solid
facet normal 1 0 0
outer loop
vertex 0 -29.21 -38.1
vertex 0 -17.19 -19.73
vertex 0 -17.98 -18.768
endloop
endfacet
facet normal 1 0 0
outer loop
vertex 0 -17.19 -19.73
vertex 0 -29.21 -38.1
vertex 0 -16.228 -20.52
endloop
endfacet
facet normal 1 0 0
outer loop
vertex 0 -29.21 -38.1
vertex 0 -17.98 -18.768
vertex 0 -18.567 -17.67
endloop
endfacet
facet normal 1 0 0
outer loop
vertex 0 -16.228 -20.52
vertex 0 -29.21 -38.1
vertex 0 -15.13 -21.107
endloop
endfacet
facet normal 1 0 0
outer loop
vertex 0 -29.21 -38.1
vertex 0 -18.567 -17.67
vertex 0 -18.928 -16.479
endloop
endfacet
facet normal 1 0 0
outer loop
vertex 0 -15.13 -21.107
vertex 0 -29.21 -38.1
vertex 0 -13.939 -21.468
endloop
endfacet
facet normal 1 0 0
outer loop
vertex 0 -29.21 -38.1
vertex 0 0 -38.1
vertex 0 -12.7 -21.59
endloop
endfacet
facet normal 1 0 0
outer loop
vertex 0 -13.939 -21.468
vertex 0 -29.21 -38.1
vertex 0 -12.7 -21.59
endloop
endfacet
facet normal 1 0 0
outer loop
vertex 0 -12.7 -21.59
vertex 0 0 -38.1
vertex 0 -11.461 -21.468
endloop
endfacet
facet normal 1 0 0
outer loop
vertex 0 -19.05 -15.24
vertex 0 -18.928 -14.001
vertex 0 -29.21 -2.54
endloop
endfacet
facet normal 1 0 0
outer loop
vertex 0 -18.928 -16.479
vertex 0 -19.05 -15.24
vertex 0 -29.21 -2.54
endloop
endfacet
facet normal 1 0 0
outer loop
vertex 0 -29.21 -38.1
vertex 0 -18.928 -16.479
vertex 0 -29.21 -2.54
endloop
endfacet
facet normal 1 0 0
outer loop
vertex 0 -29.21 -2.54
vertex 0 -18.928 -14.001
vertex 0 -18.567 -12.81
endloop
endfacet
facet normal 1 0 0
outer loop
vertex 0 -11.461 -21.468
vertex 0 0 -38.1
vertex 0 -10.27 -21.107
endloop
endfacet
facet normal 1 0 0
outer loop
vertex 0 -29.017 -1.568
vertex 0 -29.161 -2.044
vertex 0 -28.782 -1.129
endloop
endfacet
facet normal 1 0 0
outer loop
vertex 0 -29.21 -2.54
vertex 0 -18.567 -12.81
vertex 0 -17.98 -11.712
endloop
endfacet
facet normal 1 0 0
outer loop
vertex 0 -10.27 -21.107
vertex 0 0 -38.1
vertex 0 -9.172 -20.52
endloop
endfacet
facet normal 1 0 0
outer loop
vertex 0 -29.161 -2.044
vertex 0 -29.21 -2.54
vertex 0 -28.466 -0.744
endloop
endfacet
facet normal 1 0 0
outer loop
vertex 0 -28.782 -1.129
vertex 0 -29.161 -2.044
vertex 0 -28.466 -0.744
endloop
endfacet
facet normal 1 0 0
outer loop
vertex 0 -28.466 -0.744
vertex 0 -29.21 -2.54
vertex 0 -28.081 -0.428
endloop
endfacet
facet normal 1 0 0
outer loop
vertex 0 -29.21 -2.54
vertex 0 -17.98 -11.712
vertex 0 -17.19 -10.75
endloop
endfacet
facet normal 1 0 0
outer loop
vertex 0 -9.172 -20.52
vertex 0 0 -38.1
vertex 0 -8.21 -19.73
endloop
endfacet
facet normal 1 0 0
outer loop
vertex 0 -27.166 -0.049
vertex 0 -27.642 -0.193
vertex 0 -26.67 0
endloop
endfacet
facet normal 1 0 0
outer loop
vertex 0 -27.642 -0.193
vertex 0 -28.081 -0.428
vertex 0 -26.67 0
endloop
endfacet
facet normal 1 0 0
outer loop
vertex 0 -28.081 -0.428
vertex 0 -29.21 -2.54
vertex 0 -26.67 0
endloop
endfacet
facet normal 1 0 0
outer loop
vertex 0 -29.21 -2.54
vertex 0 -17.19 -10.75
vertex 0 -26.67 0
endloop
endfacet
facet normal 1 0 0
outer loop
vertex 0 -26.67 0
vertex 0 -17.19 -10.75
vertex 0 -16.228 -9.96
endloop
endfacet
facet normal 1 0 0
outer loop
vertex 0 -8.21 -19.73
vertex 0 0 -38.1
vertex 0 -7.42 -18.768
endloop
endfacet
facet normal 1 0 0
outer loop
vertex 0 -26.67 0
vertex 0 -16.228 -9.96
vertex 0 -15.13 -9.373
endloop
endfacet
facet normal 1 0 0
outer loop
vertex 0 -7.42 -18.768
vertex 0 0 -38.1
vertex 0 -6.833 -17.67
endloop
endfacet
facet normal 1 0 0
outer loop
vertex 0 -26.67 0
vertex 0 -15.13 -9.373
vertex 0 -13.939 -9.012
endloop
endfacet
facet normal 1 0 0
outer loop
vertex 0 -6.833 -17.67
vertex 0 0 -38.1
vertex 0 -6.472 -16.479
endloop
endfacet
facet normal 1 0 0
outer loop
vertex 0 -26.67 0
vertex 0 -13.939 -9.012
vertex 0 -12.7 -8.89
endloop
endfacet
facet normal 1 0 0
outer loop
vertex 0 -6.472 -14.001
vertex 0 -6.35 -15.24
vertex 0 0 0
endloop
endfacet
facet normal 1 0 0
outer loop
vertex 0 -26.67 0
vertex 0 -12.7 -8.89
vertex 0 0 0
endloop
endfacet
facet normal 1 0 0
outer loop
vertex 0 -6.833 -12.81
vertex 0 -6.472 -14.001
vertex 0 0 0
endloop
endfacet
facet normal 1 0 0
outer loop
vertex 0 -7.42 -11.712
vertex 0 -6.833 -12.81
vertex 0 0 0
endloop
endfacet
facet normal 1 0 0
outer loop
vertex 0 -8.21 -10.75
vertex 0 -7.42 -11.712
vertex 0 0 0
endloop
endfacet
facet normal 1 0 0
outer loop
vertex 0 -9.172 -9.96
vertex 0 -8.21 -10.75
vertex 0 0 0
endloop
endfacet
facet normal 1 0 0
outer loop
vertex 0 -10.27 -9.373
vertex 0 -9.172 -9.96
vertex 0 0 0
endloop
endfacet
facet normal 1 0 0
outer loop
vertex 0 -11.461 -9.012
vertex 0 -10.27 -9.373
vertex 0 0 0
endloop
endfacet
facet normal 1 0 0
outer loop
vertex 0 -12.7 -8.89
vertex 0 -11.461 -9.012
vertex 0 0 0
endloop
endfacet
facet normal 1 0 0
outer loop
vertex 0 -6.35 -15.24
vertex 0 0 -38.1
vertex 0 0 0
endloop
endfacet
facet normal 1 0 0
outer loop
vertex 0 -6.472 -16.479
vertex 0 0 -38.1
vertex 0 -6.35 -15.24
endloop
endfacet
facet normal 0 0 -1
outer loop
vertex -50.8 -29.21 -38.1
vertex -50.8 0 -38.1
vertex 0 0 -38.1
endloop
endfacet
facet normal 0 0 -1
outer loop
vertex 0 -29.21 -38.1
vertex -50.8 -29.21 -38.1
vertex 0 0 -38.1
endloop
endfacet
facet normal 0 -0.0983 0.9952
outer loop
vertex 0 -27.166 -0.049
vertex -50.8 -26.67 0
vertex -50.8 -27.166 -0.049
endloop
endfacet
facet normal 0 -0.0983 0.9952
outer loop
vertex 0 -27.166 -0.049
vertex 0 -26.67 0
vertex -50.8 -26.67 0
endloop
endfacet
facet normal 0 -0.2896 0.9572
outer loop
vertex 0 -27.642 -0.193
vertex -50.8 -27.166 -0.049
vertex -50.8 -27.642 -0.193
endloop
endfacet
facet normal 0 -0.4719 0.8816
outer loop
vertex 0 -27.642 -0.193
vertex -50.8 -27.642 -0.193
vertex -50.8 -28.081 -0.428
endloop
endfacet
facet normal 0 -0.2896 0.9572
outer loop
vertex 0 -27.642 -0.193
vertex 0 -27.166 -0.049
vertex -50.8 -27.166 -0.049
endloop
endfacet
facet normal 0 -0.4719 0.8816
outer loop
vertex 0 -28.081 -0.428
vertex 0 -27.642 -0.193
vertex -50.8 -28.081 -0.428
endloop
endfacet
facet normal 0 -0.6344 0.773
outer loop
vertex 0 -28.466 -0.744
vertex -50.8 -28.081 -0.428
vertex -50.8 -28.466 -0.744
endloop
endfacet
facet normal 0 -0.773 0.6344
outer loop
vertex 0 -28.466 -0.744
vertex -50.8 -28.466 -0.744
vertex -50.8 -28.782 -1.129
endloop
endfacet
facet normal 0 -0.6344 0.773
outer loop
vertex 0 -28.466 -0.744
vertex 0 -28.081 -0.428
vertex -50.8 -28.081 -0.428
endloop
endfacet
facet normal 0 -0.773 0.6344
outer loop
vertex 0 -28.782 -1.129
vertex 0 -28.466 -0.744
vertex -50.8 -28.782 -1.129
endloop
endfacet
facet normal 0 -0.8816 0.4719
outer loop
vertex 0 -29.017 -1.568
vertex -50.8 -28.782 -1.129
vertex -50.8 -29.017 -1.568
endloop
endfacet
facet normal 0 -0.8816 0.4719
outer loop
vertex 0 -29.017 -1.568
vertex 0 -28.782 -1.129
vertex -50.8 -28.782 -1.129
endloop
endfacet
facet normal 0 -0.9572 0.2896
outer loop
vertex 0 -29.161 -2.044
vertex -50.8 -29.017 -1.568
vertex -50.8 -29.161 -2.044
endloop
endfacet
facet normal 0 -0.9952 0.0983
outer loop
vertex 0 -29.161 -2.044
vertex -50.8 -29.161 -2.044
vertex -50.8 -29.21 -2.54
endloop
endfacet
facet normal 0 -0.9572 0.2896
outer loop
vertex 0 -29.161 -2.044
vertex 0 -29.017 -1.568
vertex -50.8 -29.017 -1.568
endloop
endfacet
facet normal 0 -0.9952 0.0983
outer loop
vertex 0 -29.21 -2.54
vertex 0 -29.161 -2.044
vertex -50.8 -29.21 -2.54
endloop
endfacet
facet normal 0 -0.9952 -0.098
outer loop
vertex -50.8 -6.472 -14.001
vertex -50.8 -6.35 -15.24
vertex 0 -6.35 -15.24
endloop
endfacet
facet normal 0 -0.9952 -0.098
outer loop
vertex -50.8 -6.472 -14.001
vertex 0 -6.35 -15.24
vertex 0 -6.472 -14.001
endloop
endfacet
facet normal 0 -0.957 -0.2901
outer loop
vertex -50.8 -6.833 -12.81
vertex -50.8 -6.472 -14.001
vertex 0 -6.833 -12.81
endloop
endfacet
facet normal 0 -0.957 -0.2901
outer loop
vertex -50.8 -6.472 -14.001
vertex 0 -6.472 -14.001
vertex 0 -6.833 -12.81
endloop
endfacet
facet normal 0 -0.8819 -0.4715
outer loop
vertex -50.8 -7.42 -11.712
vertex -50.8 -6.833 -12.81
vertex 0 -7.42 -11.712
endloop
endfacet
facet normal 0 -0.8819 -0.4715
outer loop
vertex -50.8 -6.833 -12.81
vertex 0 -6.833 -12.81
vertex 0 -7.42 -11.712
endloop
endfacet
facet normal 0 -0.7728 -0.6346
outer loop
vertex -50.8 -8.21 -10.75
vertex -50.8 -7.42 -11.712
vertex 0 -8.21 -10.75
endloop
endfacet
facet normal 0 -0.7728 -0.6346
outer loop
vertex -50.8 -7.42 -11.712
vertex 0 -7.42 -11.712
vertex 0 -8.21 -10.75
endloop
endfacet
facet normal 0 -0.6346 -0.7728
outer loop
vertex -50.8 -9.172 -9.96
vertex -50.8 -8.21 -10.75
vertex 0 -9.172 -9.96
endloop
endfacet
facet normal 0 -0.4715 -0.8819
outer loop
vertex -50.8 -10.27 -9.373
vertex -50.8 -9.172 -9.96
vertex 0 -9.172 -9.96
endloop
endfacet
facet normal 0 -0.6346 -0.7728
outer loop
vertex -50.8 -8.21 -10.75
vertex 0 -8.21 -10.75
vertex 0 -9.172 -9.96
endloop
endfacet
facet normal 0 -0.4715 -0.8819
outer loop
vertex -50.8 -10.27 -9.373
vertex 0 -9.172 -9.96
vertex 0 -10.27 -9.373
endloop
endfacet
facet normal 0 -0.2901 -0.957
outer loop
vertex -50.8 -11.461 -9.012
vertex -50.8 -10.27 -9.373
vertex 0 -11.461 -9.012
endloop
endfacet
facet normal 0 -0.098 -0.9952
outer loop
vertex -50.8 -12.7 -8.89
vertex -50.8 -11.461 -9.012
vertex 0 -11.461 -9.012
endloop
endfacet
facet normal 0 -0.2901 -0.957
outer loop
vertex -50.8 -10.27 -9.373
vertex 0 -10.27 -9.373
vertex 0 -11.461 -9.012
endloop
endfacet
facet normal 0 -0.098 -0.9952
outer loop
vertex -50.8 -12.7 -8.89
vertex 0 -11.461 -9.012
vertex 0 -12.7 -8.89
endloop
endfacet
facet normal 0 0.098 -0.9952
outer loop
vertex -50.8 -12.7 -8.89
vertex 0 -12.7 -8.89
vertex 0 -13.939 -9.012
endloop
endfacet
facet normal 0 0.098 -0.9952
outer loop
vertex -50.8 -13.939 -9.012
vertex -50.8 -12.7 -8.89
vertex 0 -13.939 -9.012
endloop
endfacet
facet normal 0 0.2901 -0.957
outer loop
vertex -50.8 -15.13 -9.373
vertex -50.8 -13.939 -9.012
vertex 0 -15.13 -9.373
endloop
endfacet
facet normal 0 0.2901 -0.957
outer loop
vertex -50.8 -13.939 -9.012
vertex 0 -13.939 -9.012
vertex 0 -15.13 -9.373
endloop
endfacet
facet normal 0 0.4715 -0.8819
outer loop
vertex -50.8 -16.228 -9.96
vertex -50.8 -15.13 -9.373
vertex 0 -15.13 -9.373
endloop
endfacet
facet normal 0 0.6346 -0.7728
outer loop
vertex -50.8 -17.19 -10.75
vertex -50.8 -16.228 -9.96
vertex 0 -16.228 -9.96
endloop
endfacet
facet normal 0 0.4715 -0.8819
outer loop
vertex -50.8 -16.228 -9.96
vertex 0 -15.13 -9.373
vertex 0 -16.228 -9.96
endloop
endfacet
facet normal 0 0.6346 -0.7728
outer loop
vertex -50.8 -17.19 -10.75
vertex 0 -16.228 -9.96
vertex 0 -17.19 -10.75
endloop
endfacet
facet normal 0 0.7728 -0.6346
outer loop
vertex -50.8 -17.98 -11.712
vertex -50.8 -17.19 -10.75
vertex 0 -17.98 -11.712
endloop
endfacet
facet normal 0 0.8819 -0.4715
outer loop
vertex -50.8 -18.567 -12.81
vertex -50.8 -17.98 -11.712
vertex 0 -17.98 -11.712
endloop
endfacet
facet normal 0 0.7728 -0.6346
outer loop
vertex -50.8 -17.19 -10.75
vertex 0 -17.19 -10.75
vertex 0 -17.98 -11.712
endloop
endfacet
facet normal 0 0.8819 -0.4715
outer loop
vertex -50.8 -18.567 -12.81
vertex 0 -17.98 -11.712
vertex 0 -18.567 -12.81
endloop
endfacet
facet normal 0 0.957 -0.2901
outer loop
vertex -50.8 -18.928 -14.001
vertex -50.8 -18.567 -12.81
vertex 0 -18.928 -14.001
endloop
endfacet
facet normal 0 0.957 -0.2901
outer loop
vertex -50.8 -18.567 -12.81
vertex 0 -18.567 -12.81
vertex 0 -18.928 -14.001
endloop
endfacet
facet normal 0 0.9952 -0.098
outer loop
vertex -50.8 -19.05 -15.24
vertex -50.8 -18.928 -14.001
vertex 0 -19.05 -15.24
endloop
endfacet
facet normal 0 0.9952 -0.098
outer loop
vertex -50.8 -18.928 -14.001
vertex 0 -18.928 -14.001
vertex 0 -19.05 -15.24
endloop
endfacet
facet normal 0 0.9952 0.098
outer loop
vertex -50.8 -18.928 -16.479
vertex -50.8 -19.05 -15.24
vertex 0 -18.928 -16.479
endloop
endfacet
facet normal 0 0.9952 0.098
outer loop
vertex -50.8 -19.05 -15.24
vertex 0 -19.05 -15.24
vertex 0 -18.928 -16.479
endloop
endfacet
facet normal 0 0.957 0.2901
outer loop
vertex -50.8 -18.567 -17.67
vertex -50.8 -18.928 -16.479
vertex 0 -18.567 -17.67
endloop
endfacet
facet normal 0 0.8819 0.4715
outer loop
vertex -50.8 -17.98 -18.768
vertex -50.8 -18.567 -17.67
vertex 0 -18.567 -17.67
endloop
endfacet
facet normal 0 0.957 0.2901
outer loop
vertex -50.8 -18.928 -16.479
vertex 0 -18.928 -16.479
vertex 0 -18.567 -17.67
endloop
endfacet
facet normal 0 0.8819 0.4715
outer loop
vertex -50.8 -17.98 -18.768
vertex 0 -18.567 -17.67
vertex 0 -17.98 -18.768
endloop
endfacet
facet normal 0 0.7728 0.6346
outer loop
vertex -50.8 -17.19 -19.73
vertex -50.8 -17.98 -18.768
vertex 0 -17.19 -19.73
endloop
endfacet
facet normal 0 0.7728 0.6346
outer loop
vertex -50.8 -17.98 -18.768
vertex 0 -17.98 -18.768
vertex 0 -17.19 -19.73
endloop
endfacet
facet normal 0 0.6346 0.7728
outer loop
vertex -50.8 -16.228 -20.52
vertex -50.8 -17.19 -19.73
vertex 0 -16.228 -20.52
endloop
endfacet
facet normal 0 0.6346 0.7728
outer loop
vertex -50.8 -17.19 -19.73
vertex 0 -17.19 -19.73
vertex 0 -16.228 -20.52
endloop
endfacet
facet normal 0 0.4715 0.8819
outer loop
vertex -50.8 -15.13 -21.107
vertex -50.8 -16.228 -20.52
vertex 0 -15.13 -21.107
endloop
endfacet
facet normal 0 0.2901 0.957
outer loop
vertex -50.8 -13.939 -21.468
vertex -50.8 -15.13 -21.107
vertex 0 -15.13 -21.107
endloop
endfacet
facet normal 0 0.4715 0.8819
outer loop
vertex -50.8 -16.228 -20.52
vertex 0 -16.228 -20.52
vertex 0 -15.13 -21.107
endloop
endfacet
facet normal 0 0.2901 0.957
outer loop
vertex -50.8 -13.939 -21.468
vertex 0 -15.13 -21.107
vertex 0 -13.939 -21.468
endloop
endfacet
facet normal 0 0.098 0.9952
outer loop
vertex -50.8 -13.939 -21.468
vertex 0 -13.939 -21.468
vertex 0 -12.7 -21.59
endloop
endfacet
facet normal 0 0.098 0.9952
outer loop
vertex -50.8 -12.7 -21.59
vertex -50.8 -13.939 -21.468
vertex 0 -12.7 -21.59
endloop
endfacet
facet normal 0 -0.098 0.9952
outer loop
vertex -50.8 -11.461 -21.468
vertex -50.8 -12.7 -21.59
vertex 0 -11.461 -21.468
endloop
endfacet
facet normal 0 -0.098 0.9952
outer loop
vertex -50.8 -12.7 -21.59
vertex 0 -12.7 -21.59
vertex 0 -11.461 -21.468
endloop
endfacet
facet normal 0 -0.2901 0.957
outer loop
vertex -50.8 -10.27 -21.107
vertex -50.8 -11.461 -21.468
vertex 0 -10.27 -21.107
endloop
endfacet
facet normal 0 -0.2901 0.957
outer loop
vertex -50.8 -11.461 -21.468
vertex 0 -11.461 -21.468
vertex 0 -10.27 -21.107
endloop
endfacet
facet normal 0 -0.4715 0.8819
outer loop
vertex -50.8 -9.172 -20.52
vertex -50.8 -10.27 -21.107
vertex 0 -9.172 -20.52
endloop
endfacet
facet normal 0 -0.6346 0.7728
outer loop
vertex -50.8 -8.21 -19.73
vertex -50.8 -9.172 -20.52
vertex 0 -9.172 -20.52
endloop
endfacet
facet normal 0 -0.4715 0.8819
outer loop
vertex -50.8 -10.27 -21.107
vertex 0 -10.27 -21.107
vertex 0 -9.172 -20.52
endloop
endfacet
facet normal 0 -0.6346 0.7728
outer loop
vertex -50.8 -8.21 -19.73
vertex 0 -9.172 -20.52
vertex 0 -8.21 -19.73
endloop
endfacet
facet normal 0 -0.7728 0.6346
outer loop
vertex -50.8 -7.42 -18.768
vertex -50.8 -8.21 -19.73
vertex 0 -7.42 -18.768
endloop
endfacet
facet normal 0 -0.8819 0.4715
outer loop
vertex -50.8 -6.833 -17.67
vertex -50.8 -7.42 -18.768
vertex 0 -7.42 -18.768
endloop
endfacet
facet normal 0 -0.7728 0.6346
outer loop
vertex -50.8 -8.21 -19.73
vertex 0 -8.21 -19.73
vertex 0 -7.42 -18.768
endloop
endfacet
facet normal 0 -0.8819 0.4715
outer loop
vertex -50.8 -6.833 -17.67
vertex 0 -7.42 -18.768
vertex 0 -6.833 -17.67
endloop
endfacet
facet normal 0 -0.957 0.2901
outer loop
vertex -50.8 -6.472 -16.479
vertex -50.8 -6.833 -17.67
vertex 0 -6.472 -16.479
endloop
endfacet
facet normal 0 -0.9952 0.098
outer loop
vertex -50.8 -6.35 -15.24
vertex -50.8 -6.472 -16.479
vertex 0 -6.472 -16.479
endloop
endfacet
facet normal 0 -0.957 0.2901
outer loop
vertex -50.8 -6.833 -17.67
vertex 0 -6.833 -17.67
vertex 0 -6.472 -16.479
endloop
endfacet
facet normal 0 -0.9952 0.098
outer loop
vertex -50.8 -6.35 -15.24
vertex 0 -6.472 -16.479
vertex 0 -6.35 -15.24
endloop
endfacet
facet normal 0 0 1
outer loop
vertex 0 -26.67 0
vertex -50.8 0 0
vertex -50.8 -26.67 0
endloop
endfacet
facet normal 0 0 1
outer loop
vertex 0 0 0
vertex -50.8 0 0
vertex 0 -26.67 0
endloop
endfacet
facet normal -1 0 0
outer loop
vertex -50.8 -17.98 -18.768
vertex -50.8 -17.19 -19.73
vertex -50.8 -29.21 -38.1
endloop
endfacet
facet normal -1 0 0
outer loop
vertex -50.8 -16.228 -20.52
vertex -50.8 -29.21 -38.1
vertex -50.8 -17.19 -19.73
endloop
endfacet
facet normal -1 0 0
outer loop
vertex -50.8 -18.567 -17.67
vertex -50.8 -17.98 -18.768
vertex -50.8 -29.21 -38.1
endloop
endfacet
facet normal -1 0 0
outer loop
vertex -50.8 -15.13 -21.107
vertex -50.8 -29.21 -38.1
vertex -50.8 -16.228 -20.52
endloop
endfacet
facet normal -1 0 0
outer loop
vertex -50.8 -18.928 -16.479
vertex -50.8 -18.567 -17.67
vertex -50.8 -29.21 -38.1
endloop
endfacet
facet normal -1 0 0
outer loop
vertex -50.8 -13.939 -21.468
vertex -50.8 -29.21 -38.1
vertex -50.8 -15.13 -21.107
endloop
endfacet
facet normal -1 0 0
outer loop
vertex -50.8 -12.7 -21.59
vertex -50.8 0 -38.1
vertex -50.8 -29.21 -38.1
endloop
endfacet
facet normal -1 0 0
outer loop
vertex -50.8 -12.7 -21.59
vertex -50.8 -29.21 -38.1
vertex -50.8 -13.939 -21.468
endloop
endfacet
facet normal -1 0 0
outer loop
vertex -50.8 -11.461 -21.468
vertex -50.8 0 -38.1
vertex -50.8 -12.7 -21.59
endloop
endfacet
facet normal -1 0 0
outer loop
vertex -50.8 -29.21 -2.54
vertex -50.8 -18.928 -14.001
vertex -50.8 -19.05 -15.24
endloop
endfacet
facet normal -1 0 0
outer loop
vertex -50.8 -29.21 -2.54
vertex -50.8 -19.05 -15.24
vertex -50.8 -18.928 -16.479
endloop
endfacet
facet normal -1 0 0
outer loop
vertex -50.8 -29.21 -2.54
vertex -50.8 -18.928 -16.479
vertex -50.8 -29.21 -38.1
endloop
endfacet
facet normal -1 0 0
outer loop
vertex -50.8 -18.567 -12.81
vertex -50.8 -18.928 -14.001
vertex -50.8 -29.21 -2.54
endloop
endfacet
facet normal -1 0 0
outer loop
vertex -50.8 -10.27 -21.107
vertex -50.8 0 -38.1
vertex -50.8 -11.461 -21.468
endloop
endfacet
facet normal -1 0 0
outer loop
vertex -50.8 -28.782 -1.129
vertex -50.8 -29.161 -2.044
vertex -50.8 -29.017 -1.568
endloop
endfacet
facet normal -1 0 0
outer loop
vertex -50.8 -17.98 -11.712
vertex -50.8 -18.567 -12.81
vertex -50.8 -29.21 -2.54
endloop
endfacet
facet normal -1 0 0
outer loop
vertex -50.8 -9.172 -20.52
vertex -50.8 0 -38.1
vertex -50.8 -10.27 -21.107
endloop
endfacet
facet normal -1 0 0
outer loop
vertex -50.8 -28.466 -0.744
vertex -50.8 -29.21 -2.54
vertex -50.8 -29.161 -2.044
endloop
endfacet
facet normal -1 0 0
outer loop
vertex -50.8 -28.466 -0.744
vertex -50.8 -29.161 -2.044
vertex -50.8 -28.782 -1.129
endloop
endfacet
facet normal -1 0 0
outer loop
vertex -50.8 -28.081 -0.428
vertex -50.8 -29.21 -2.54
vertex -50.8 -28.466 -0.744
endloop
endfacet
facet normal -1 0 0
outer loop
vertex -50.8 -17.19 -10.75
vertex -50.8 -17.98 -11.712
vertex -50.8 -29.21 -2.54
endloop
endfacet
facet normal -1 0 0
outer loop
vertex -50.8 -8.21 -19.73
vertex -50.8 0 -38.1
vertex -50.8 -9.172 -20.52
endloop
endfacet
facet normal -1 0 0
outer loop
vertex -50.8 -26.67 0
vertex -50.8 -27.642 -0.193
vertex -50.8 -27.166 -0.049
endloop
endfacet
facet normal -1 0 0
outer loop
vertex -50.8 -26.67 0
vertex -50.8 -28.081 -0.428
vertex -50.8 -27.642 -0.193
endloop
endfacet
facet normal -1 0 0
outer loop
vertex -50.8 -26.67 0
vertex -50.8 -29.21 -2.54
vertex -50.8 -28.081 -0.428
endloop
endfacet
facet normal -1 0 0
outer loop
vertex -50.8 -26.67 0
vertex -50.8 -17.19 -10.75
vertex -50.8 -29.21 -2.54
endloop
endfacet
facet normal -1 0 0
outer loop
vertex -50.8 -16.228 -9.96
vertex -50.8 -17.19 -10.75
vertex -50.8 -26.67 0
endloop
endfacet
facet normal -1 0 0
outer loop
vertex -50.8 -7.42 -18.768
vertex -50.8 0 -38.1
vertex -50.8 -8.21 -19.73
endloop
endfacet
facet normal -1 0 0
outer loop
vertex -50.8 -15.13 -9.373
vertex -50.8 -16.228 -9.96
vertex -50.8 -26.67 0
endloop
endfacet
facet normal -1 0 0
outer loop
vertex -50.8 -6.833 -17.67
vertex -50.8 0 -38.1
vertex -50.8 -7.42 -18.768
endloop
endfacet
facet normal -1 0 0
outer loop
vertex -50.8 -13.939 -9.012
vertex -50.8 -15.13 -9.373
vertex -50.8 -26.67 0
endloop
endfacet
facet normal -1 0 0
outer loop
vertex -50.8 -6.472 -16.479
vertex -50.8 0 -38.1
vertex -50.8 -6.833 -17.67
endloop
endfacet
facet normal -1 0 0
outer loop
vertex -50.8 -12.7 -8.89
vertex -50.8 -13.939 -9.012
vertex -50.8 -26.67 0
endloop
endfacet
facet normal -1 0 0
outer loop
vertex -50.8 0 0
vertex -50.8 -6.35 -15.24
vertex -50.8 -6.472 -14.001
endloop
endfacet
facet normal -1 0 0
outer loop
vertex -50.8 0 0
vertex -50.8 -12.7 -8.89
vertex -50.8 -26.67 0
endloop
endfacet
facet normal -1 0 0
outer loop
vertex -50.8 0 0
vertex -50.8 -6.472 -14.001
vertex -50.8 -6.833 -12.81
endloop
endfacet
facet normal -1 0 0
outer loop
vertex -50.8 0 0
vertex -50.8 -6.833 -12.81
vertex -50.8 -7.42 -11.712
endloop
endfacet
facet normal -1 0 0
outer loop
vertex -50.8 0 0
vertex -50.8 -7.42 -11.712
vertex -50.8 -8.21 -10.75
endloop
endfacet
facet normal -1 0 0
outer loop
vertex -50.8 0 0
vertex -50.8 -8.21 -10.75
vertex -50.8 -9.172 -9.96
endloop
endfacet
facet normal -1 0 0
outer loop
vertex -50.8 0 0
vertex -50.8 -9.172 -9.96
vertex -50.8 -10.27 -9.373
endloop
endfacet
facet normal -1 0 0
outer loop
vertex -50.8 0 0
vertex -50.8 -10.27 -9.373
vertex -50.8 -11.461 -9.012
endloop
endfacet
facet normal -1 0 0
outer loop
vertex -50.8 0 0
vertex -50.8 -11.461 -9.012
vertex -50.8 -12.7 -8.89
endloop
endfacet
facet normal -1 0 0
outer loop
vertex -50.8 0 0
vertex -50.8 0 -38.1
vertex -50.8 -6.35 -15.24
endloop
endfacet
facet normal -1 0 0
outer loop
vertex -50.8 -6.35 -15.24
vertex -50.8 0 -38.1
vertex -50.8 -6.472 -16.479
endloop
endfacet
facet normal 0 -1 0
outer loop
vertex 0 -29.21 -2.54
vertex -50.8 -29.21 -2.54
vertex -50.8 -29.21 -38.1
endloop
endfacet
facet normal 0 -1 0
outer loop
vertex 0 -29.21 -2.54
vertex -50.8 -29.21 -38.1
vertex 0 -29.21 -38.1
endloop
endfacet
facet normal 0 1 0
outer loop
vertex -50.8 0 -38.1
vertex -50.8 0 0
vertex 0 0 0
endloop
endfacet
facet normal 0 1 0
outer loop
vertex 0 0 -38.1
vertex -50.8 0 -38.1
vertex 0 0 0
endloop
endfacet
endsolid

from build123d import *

# Parameters (mm, degrees)
F0_W     = 50.8
F0_H     = 38.1
F1_DEPTH = 29.21
F2_R     = 2.54
F3_R     = 6.35
F4_DEPTH = 50.8


with BuildPart() as f1:
    # F0 (on Front) → F1 (new body)
    with BuildSketch(Plane.XZ):
        with Locations((-25.4, -19.05)):
            Rectangle(F0_W, F0_H)
    extrude(amount=F1_DEPTH)

    # F2
    f2_edges = [f1.edges().sort_by_distance(p)[0] for p in [
        (-25.4, -29.21, 0),
    ]]
    fillet(f2_edges, radius=F2_R)

    # F3 (on face) → F4 (cut, through all)
    with BuildSketch(Plane.YZ):
        with Locations((-12.7, -15.24)):
            Circle(F3_R)
    extrude(amount=-F4_DEPTH, mode=Mode.SUBTRACT)


solid = f1.part
